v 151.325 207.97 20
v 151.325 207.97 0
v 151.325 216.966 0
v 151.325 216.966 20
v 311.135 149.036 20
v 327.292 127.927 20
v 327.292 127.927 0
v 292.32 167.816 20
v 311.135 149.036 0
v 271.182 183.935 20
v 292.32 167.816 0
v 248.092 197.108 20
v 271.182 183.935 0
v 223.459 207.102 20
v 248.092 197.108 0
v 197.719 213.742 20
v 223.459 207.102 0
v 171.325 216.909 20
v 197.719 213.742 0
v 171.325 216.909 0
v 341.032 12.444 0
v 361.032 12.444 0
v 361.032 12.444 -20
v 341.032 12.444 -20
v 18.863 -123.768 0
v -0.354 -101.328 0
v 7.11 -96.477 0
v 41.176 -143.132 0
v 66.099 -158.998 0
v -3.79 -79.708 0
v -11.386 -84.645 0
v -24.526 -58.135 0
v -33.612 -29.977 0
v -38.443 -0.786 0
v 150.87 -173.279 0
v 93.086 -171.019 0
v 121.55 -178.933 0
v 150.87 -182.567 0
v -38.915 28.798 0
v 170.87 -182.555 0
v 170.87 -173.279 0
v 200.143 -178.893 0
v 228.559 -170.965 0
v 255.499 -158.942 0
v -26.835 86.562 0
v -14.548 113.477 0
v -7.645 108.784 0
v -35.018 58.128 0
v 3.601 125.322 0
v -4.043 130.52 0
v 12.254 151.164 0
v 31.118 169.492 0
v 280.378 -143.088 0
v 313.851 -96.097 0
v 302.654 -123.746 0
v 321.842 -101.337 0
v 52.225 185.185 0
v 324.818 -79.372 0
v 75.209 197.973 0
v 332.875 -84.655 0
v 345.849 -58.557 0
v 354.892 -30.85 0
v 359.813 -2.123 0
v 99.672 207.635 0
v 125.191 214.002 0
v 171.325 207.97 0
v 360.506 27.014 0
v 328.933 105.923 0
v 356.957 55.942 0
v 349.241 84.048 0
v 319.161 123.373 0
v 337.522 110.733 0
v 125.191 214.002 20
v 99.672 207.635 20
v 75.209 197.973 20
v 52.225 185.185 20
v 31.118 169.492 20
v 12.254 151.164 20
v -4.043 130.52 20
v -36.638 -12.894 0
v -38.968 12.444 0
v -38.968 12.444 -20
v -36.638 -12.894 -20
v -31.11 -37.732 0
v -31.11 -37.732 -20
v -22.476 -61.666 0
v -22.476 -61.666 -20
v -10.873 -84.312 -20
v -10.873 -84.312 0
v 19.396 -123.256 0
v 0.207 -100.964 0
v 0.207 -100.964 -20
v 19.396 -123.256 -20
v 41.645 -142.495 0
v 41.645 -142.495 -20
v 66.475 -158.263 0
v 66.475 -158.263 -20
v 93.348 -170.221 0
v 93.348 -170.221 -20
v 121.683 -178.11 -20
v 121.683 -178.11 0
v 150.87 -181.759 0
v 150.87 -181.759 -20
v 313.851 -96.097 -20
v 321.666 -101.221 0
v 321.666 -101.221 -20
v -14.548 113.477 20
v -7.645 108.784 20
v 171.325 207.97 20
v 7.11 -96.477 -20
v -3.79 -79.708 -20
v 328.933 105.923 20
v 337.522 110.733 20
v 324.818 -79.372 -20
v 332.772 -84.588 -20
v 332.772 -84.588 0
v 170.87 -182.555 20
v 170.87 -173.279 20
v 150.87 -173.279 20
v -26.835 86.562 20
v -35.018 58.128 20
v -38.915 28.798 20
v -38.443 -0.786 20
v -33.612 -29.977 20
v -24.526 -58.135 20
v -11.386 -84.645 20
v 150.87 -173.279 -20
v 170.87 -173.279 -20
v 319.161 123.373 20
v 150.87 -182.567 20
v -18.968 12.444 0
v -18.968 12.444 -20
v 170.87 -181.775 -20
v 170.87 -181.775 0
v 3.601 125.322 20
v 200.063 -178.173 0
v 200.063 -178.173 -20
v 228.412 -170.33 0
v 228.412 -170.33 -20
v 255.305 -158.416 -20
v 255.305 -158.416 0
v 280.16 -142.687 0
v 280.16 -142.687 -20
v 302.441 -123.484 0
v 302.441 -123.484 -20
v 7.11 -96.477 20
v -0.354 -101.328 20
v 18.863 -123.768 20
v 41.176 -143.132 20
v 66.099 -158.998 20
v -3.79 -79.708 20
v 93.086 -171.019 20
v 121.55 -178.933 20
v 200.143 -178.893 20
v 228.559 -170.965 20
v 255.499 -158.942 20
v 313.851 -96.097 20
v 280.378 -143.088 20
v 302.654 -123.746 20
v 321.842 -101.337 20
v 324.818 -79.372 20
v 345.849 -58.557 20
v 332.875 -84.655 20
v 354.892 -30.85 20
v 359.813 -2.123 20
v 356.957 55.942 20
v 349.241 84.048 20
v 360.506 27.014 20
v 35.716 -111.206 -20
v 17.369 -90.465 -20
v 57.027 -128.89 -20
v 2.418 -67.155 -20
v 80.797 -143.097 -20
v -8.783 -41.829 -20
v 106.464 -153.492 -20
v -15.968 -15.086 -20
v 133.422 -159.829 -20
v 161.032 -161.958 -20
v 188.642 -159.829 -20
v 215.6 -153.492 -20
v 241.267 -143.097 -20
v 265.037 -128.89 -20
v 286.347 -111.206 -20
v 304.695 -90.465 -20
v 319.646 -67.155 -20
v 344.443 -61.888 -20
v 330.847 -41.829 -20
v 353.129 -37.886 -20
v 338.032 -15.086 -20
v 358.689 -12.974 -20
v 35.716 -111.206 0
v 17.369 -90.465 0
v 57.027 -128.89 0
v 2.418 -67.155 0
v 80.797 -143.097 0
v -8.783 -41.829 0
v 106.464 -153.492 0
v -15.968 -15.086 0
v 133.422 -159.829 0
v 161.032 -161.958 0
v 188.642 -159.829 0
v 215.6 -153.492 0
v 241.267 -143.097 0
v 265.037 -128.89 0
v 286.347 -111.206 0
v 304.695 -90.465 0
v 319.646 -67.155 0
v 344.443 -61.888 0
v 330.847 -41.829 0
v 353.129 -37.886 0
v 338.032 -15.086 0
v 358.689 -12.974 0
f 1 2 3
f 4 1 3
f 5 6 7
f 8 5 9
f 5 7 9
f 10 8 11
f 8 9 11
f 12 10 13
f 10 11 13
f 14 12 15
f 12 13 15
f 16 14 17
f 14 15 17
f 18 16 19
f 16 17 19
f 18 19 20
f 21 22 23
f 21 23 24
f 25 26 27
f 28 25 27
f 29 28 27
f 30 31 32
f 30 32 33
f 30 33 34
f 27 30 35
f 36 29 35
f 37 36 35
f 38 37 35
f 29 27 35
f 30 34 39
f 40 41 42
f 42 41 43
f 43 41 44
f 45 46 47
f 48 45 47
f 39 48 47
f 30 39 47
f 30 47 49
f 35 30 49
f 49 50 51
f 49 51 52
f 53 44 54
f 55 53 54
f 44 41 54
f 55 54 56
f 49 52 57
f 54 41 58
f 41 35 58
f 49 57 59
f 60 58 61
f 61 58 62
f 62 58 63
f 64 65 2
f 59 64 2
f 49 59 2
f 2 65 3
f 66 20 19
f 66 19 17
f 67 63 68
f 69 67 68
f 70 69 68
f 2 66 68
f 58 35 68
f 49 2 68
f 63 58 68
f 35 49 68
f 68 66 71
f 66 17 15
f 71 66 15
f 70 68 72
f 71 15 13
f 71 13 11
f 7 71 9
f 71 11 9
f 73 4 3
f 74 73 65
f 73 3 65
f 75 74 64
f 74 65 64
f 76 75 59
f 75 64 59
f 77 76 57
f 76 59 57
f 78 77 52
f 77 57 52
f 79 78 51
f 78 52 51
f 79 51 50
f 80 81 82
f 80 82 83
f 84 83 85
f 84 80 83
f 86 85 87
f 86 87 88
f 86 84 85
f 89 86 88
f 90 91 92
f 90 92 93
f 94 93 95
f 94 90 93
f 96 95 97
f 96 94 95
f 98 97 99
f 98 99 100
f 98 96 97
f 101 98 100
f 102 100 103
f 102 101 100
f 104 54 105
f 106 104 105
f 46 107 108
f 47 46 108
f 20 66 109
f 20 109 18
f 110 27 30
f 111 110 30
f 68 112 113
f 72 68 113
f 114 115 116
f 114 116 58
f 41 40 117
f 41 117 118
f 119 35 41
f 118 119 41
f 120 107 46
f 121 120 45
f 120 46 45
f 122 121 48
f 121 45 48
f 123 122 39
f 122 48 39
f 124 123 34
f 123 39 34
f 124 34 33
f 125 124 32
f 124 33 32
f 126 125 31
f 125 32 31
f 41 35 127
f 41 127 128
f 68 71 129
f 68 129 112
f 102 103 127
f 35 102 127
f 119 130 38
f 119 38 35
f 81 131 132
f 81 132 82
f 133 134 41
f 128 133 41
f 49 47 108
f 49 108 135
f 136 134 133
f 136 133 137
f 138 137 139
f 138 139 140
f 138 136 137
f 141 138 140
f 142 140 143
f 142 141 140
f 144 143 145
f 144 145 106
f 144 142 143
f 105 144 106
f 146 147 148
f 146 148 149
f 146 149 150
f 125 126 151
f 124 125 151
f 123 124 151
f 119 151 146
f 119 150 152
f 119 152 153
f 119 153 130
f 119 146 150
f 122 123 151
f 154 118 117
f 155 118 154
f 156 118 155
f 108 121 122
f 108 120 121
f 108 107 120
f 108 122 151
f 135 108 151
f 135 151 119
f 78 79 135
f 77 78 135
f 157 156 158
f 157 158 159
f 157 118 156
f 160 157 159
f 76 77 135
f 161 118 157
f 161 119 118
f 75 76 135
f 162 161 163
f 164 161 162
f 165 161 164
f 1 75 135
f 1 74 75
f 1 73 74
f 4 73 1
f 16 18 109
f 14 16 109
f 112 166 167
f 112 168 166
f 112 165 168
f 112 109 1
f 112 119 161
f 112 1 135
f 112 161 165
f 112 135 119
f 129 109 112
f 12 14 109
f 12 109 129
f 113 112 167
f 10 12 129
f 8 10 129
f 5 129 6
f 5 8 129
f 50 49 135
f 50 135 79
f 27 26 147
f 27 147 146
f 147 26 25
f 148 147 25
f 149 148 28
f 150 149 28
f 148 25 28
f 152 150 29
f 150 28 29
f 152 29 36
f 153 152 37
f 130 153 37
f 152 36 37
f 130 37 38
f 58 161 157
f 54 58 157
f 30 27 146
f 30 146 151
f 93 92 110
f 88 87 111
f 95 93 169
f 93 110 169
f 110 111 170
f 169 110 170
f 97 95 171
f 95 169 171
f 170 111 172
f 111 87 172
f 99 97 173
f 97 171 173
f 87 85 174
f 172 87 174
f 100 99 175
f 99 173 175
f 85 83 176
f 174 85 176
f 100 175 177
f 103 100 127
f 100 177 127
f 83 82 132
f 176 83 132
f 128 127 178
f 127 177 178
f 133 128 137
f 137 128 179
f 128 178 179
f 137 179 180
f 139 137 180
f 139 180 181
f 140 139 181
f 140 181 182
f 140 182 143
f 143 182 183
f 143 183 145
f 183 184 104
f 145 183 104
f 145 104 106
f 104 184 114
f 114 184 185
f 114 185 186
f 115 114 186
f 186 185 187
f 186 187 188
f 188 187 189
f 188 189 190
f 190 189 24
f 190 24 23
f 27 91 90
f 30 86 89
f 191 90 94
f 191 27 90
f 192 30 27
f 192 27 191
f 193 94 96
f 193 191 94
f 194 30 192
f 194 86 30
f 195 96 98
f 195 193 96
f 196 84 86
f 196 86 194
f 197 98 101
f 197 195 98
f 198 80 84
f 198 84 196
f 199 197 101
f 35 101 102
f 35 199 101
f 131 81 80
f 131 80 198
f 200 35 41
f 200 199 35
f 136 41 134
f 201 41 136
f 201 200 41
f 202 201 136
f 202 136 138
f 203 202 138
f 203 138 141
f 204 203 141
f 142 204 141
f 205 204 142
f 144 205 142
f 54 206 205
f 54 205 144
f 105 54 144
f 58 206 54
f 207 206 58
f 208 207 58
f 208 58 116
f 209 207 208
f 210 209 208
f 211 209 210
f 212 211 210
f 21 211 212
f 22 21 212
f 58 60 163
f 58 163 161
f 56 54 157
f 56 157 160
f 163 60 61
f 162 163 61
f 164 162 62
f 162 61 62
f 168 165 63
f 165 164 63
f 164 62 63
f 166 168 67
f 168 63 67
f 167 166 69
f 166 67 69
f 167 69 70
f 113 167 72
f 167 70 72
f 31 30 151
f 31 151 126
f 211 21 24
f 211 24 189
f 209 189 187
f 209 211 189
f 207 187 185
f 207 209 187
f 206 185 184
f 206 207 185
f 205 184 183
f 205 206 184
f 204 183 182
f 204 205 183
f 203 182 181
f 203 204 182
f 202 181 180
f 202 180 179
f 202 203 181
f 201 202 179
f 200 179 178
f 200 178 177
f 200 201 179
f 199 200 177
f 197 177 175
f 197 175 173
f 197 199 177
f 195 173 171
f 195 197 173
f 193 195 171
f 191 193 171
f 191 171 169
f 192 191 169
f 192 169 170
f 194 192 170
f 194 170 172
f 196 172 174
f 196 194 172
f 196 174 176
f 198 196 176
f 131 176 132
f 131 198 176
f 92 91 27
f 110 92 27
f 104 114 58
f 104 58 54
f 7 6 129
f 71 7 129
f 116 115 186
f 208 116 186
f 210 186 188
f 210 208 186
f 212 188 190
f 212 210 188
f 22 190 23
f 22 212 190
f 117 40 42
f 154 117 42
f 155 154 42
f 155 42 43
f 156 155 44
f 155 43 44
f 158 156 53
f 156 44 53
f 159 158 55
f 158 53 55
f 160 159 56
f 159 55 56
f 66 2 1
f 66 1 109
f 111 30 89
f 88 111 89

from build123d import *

# Parameters (mm, degrees)
F1_DEPTH  = 20
F2_W      = 20
F2_H      = 10
F3_DEPTH  = 20
F5_DEPTH  = 20
F7_DEPTH  = 20
F8_R      = 200
F9_DEPTH  = 20
F10_DEPTH = 20
F11_DEPTH = 20
F12_DEPTH = 20
F13_W     = 20
F13_H     = 10
F14_DEPTH = 20


with BuildPart() as f1:
    # F0 (on Top) → F1 (new body)
    with BuildSketch(Plane.XY):
        with BuildLine():
            ThreePointArc((-38.9680378139, 12.4435741454), (161.0319621861, -182.017354603), (361.0319621861, 12.4435741454))
            Line((361.0319621861, 12.4435741454), (341.0319621861, 12.4435741454))
            ThreePointArc((341.0319621861, 12.4435741454), (161.0319621861, -161.9579334856), (-18.9680378139, 12.4435741454))
            Line((-18.9680378139, 12.4435741454), (-38.9680378139, 12.4435741454))
        make_face()
    extrude(amount=-F1_DEPTH)

    # F2 (on Top) → F3 (cut)
    with BuildSketch(Plane.XY):
        with Locations((160.8697362244, -178.2794445753)):
            Rectangle(F2_W, F2_H)
    extrude(amount=-F3_DEPTH, mode=Mode.SUBTRACT)

    # F4 (on Top) → F5 (cut)
    with BuildSketch(Plane.XY):
        Polygon((-12.1746574023, -85.1580928149), (-1.2748891549, -101.9269643378), (7.1095466066, -96.477080214), (-3.7902216409, -79.7082086911), align=None)
    extrude(amount=-F5_DEPTH, mode=Mode.SUBTRACT)

    # F6 (on Top) → F7 (cut)
    with BuildSketch(Plane.XY):
        Polygon((313.8510156457, -96.097187023), (322.2134615593, -101.5807532297), (333.1805939725, -84.8558614025), (324.818148059, -79.3722951959), align=None)
    extrude(amount=-F7_DEPTH, mode=Mode.SUBTRACT)

    # F6 (on Top) + F4 (on Top) + F2 (on Top) → F12 (cut)
    with BuildSketch(Plane.XY):
        Polygon((313.8510156457, -96.097187023), (322.2134615593, -101.5807532297), (333.1805939725, -84.8558614025), (324.818148059, -79.3722951959), align=None)
    with BuildSketch(Plane.XY):
        Polygon((-12.1746574023, -85.1580928149), (-1.2748891549, -101.9269643378), (7.1095466066, -96.477080214), (-3.7902216409, -79.7082086911), align=None)
    with BuildSketch(Plane.XY):
        with Locations((160.8697362244, -178.2794445753)):
            Rectangle(F2_W, F2_H)
    extrude(amount=F12_DEPTH, mode=Mode.SUBTRACT)


with BuildPart() as f9:
    # F8 (on Top) → F9 (new body)
    with BuildSketch(Plane.XY):
        with Locations((160.7474684715, 17.1884819865)):
            Circle(F8_R)
    extrude(amount=F9_DEPTH)

    # F6 (on Top) + F4 (on Top) → F10 (cut)
    with BuildSketch(Plane.XY):
        Polygon((313.8510156457, -96.097187023), (322.2134615593, -101.5807532297), (333.1805939725, -84.8558614025), (324.818148059, -79.3722951959), align=None)
    with BuildSketch(Plane.XY):
        Polygon((-12.1746574023, -85.1580928149), (-1.2748891549, -101.9269643378), (7.1095466066, -96.477080214), (-3.7902216409, -79.7082086911), align=None)
    extrude(amount=F10_DEPTH, mode=Mode.SUBTRACT)

    # F2 (on Top) → F11 (cut)
    with BuildSketch(Plane.XY):
        with Locations((160.8697362244, -178.2794445753)):
            Rectangle(F2_W, F2_H)
    extrude(amount=F11_DEPTH, mode=Mode.SUBTRACT)

    # F13 (on Top) → F14 (cut)
    with BuildSketch(Plane.XY):
        Polygon((-4.6685326042, 130.9453286874), (-15.9147333194, 114.4067988412), (-7.6454683963, 108.7836984836), (3.6007323189, 125.3222283298), align=None)
        with Locations((161.3246947527, 212.9703313112)):
            Rectangle(F13_W, F13_H)
        Polygon((328.9325923598, 105.9228052474), (337.6576488008, 110.8088455769), (327.8855681419, 128.2589584589), (319.1605117009, 123.3729181295), align=None)
    extrude(amount=F14_DEPTH, mode=Mode.SUBTRACT)


solid = Compound([f1.part, f9.part])
